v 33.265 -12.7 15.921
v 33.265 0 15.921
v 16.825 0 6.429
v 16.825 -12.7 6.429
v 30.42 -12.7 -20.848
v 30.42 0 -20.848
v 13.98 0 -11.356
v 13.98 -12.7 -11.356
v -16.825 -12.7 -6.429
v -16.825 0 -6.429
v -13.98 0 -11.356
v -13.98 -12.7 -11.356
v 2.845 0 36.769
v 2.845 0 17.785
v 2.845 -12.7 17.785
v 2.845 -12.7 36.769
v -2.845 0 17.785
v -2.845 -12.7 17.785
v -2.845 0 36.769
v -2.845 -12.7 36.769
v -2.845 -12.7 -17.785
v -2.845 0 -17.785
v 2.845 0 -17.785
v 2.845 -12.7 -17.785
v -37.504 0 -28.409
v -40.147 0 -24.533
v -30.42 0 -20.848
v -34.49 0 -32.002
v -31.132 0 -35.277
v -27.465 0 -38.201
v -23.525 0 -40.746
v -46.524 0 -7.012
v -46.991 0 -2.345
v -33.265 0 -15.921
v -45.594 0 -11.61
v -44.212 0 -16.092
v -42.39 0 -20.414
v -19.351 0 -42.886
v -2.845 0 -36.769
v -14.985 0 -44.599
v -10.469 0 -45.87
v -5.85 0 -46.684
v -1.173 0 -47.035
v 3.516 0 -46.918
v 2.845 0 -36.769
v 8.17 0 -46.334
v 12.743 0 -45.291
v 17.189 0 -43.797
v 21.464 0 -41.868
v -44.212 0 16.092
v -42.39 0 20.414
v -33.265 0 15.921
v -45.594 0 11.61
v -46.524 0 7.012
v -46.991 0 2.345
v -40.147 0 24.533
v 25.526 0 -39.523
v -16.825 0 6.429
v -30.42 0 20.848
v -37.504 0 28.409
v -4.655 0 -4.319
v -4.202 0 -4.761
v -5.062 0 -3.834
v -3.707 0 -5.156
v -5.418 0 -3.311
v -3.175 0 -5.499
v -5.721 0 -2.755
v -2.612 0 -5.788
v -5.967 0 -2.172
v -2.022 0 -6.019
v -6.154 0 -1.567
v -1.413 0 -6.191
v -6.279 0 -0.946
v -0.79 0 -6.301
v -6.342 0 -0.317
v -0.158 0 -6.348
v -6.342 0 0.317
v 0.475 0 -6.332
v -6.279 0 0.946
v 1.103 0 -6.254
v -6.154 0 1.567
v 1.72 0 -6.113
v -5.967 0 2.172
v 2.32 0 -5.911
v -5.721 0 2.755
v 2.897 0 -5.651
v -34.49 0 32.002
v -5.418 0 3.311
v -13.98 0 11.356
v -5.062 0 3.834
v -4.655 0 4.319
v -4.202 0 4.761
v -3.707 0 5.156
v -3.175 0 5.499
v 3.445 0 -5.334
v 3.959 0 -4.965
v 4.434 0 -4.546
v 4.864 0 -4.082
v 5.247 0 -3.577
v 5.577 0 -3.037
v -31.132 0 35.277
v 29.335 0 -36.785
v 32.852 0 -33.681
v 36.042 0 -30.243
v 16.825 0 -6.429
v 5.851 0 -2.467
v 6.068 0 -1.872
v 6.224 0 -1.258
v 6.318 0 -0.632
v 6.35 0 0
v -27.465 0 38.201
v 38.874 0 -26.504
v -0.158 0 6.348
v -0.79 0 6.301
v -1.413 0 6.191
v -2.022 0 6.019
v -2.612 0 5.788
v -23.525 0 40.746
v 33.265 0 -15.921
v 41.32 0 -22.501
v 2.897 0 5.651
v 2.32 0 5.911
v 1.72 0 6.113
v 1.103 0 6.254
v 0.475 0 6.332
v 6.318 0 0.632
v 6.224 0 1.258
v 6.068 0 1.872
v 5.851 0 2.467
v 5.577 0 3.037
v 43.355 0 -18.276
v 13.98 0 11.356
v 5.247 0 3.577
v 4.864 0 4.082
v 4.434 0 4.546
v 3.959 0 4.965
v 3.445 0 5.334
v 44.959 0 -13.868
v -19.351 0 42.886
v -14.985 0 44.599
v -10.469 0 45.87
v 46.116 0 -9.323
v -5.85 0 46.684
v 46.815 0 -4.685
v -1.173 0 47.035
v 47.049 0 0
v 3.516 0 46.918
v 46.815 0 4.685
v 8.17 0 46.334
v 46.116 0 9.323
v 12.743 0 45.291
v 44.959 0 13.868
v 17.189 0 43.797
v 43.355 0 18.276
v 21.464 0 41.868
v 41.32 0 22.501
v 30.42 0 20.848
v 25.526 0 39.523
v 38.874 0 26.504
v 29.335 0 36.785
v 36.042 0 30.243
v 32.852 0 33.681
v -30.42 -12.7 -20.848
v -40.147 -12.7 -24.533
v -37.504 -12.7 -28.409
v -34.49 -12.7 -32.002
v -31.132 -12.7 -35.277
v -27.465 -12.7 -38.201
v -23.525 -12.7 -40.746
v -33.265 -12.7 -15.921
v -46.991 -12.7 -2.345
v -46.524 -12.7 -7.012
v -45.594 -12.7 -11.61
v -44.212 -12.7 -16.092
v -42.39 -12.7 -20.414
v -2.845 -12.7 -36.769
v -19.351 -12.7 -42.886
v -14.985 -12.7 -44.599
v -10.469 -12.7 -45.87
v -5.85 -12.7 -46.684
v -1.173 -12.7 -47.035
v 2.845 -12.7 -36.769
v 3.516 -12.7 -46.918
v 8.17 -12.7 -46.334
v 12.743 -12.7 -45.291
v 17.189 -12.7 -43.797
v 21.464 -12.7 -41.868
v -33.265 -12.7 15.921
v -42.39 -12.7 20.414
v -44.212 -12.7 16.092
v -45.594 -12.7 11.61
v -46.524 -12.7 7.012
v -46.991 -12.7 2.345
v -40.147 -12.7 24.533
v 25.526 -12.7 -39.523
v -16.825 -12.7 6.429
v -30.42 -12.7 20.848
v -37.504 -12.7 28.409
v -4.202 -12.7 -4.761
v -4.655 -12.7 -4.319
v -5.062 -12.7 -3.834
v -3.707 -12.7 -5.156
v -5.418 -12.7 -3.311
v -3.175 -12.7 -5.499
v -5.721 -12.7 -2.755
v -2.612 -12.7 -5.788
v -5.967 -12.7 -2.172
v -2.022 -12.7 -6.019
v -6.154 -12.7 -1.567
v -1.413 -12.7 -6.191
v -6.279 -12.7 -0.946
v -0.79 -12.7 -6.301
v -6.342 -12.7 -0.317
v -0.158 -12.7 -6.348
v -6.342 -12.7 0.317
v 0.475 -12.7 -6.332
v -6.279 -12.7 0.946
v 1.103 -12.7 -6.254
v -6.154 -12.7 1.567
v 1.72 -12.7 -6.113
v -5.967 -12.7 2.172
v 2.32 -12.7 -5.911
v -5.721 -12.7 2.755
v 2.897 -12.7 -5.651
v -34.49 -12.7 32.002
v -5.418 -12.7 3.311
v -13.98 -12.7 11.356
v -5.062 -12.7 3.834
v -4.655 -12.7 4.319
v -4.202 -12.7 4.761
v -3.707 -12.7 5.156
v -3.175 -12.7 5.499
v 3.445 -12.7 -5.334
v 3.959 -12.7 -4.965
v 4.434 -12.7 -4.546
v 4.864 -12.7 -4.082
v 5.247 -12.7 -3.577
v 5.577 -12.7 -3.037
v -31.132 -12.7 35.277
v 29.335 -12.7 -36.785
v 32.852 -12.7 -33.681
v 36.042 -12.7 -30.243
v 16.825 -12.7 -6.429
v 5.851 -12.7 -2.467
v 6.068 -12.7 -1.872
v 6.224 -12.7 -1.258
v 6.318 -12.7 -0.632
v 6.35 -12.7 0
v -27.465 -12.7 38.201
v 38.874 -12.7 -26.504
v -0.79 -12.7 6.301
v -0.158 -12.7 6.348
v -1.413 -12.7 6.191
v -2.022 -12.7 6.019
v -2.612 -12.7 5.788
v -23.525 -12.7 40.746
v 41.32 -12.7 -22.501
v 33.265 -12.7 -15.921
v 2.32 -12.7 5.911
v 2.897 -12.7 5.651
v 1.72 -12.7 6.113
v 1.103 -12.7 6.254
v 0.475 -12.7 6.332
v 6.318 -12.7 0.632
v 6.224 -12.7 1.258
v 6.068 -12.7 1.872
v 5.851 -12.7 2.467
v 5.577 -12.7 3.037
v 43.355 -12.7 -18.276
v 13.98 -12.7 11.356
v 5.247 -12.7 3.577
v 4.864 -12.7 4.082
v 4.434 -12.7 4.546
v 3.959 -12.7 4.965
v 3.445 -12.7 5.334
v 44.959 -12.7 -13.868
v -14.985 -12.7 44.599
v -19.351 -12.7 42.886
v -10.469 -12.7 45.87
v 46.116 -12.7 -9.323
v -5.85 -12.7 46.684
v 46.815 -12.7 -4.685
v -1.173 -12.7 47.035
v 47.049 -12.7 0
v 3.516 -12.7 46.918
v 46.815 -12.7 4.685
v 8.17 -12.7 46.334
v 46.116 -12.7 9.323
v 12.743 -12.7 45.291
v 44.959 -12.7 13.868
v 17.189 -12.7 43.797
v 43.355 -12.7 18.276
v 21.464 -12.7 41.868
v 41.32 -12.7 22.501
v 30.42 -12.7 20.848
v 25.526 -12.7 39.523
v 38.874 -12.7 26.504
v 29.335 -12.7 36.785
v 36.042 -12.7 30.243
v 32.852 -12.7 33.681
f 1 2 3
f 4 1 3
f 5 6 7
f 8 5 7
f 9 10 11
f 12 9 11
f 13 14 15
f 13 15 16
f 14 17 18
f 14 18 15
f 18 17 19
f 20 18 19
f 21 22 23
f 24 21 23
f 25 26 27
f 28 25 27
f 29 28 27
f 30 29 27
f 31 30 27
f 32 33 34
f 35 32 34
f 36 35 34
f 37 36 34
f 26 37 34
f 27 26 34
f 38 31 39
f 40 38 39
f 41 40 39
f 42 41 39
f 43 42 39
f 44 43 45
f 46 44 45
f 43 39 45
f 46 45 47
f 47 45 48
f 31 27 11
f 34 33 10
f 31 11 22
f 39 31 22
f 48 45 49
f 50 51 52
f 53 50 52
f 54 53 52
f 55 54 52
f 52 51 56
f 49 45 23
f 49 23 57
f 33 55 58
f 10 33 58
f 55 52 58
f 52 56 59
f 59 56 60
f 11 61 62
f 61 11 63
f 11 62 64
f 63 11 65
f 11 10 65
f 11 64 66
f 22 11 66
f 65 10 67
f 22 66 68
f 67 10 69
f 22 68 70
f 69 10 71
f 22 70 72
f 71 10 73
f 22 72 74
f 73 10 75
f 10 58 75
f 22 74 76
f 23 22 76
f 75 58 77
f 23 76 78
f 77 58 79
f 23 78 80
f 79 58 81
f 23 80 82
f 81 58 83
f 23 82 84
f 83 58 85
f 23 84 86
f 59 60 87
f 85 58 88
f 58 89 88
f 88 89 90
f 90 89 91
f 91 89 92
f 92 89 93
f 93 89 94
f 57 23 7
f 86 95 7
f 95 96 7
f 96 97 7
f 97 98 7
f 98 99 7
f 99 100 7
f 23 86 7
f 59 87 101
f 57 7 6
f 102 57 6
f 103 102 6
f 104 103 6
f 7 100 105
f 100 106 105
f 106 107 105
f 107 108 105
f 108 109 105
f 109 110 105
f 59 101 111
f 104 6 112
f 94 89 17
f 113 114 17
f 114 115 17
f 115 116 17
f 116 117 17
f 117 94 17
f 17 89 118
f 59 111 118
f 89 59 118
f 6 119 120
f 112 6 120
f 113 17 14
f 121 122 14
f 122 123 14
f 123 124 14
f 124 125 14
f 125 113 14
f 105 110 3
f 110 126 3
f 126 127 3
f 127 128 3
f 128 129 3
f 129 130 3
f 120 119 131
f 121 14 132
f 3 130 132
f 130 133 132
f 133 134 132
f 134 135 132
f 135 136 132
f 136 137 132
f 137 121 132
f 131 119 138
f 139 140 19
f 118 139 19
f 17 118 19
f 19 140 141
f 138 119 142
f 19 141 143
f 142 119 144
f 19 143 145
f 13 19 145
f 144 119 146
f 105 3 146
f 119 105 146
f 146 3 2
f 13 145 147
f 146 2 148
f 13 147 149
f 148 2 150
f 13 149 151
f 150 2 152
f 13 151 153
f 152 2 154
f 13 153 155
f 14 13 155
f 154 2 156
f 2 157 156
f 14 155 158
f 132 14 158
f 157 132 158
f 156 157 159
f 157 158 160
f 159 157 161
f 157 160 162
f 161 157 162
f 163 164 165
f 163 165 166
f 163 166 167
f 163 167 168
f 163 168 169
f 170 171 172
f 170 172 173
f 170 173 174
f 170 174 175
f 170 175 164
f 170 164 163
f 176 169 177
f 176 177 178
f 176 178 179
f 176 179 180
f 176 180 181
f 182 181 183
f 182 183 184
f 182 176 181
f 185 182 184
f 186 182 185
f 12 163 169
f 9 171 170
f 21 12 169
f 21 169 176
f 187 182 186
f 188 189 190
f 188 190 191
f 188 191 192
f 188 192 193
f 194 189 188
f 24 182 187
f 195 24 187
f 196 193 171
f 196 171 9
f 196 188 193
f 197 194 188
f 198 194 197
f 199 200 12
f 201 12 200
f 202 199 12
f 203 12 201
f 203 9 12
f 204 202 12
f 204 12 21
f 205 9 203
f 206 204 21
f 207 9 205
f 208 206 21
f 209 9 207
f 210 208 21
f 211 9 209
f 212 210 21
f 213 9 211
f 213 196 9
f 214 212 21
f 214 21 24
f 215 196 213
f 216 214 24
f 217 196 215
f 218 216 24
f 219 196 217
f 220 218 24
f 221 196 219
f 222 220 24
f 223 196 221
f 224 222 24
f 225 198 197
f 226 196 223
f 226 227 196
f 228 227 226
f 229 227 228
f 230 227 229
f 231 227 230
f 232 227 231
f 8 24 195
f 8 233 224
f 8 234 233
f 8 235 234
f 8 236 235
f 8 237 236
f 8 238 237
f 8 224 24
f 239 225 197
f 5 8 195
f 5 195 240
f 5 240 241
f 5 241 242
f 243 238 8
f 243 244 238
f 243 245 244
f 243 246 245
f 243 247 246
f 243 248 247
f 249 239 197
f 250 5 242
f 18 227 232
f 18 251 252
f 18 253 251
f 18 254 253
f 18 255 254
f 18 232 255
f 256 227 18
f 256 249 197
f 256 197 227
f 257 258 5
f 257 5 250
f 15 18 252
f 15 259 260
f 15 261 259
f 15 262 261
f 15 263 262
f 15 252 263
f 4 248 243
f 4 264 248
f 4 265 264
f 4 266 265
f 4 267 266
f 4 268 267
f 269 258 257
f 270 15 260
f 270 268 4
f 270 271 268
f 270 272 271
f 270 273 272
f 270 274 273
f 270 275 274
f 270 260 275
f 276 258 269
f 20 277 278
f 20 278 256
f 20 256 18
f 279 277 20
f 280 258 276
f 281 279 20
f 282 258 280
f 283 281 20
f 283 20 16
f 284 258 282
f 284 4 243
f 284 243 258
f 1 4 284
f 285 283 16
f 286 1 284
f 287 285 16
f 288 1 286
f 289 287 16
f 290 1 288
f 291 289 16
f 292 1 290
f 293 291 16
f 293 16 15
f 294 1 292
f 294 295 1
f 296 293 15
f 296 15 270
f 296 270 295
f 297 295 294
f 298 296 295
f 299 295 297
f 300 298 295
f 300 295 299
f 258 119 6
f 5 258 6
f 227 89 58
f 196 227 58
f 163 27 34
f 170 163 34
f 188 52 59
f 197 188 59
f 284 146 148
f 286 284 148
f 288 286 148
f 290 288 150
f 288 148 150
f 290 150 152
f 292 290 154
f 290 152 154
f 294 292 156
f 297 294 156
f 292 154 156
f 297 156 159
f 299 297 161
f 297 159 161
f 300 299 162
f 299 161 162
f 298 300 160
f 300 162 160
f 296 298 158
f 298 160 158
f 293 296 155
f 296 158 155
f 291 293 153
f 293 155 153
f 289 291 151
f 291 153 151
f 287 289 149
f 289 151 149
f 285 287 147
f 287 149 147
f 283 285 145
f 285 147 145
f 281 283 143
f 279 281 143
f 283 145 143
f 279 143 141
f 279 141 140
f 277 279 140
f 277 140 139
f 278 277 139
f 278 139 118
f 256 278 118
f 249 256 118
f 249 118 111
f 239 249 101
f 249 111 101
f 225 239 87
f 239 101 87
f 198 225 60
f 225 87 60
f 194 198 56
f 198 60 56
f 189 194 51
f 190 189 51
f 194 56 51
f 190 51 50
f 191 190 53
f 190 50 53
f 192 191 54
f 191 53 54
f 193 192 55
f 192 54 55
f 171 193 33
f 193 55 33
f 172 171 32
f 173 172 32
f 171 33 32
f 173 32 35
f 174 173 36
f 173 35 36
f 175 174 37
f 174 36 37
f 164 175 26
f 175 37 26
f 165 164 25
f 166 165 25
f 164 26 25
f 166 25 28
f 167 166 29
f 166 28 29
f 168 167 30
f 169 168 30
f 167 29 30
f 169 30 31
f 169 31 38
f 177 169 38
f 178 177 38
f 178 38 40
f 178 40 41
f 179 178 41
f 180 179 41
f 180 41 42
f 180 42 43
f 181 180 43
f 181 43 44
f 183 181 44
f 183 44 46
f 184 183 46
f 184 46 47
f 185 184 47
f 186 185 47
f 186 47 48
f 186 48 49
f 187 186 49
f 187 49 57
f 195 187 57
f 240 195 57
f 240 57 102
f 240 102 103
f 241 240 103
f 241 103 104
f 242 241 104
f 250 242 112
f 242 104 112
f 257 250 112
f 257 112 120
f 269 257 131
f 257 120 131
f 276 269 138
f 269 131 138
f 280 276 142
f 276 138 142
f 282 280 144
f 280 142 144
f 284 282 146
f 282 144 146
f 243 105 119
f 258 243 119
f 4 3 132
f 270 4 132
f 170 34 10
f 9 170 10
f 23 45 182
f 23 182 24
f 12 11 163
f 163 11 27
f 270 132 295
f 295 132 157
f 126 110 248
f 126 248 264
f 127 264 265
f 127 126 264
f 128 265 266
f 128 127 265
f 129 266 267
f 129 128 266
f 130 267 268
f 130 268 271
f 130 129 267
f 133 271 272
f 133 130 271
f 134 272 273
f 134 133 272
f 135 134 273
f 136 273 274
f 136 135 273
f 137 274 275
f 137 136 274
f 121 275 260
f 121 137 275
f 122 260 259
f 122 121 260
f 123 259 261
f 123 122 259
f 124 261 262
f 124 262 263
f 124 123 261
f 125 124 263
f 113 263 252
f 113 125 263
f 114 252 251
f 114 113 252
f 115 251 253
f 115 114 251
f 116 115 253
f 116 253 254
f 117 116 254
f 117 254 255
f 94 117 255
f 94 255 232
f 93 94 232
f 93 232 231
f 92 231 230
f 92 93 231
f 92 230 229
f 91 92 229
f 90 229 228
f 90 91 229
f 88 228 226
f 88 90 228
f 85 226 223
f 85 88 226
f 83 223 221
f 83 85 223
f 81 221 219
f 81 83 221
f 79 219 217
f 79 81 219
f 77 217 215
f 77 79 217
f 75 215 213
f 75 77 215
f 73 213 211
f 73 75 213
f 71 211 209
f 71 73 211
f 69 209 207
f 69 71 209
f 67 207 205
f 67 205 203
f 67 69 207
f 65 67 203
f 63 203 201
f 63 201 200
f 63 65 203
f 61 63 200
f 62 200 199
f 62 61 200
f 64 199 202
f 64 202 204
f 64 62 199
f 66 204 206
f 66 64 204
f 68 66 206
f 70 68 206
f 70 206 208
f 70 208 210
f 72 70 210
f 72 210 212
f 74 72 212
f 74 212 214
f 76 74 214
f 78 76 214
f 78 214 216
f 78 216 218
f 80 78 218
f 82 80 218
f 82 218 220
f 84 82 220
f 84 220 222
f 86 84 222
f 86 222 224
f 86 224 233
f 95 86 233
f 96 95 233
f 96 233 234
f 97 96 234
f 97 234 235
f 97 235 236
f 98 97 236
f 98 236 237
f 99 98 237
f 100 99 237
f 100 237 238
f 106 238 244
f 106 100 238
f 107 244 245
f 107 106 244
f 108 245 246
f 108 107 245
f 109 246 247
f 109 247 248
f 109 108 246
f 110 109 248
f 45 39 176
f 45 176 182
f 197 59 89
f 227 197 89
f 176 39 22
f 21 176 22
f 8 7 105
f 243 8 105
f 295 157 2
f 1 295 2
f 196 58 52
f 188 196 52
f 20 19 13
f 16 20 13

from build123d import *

# Parameters (mm, degrees)
F0_R     = 47.049259
F0_W     = 5.6896
F0_H     = 18.983845
F0_R_2   = 6.35
F1_DEPTH = 12.7


with BuildPart() as f1:
    # F0 (on Front) → F1 (new body)
    with BuildSketch(Plane.XZ):
        Circle(F0_R)
        Polygon((-33.26515, -15.920751), (-16.824658, -6.428829), (-13.979858, -11.356167), (-30.42035, -20.848089), align=None, mode=Mode.SUBTRACT)
        with Locations((0, -27.276919)):
            Rectangle(F0_W, F0_H, mode=Mode.SUBTRACT)
        Polygon((30.42035, -20.848089), (13.979858, -11.356167), (16.824658, -6.428829), (33.26515, -15.920751), align=None, mode=Mode.SUBTRACT)
        Polygon((-30.42035, 20.848089), (-13.979858, 11.356167), (-16.824658, 6.428829), (-33.26515, 15.920751), align=None, mode=Mode.SUBTRACT)
        Circle(F0_R_2, mode=Mode.SUBTRACT)
        Polygon((33.26515, 15.920751), (16.824658, 6.428829), (13.979858, 11.356167), (30.42035, 20.848089), align=None, mode=Mode.SUBTRACT)
        with Locations((0, 27.276919)):
            Rectangle(F0_W, F0_H, mode=Mode.SUBTRACT)
    extrude(amount=F1_DEPTH)


solid = f1.part
